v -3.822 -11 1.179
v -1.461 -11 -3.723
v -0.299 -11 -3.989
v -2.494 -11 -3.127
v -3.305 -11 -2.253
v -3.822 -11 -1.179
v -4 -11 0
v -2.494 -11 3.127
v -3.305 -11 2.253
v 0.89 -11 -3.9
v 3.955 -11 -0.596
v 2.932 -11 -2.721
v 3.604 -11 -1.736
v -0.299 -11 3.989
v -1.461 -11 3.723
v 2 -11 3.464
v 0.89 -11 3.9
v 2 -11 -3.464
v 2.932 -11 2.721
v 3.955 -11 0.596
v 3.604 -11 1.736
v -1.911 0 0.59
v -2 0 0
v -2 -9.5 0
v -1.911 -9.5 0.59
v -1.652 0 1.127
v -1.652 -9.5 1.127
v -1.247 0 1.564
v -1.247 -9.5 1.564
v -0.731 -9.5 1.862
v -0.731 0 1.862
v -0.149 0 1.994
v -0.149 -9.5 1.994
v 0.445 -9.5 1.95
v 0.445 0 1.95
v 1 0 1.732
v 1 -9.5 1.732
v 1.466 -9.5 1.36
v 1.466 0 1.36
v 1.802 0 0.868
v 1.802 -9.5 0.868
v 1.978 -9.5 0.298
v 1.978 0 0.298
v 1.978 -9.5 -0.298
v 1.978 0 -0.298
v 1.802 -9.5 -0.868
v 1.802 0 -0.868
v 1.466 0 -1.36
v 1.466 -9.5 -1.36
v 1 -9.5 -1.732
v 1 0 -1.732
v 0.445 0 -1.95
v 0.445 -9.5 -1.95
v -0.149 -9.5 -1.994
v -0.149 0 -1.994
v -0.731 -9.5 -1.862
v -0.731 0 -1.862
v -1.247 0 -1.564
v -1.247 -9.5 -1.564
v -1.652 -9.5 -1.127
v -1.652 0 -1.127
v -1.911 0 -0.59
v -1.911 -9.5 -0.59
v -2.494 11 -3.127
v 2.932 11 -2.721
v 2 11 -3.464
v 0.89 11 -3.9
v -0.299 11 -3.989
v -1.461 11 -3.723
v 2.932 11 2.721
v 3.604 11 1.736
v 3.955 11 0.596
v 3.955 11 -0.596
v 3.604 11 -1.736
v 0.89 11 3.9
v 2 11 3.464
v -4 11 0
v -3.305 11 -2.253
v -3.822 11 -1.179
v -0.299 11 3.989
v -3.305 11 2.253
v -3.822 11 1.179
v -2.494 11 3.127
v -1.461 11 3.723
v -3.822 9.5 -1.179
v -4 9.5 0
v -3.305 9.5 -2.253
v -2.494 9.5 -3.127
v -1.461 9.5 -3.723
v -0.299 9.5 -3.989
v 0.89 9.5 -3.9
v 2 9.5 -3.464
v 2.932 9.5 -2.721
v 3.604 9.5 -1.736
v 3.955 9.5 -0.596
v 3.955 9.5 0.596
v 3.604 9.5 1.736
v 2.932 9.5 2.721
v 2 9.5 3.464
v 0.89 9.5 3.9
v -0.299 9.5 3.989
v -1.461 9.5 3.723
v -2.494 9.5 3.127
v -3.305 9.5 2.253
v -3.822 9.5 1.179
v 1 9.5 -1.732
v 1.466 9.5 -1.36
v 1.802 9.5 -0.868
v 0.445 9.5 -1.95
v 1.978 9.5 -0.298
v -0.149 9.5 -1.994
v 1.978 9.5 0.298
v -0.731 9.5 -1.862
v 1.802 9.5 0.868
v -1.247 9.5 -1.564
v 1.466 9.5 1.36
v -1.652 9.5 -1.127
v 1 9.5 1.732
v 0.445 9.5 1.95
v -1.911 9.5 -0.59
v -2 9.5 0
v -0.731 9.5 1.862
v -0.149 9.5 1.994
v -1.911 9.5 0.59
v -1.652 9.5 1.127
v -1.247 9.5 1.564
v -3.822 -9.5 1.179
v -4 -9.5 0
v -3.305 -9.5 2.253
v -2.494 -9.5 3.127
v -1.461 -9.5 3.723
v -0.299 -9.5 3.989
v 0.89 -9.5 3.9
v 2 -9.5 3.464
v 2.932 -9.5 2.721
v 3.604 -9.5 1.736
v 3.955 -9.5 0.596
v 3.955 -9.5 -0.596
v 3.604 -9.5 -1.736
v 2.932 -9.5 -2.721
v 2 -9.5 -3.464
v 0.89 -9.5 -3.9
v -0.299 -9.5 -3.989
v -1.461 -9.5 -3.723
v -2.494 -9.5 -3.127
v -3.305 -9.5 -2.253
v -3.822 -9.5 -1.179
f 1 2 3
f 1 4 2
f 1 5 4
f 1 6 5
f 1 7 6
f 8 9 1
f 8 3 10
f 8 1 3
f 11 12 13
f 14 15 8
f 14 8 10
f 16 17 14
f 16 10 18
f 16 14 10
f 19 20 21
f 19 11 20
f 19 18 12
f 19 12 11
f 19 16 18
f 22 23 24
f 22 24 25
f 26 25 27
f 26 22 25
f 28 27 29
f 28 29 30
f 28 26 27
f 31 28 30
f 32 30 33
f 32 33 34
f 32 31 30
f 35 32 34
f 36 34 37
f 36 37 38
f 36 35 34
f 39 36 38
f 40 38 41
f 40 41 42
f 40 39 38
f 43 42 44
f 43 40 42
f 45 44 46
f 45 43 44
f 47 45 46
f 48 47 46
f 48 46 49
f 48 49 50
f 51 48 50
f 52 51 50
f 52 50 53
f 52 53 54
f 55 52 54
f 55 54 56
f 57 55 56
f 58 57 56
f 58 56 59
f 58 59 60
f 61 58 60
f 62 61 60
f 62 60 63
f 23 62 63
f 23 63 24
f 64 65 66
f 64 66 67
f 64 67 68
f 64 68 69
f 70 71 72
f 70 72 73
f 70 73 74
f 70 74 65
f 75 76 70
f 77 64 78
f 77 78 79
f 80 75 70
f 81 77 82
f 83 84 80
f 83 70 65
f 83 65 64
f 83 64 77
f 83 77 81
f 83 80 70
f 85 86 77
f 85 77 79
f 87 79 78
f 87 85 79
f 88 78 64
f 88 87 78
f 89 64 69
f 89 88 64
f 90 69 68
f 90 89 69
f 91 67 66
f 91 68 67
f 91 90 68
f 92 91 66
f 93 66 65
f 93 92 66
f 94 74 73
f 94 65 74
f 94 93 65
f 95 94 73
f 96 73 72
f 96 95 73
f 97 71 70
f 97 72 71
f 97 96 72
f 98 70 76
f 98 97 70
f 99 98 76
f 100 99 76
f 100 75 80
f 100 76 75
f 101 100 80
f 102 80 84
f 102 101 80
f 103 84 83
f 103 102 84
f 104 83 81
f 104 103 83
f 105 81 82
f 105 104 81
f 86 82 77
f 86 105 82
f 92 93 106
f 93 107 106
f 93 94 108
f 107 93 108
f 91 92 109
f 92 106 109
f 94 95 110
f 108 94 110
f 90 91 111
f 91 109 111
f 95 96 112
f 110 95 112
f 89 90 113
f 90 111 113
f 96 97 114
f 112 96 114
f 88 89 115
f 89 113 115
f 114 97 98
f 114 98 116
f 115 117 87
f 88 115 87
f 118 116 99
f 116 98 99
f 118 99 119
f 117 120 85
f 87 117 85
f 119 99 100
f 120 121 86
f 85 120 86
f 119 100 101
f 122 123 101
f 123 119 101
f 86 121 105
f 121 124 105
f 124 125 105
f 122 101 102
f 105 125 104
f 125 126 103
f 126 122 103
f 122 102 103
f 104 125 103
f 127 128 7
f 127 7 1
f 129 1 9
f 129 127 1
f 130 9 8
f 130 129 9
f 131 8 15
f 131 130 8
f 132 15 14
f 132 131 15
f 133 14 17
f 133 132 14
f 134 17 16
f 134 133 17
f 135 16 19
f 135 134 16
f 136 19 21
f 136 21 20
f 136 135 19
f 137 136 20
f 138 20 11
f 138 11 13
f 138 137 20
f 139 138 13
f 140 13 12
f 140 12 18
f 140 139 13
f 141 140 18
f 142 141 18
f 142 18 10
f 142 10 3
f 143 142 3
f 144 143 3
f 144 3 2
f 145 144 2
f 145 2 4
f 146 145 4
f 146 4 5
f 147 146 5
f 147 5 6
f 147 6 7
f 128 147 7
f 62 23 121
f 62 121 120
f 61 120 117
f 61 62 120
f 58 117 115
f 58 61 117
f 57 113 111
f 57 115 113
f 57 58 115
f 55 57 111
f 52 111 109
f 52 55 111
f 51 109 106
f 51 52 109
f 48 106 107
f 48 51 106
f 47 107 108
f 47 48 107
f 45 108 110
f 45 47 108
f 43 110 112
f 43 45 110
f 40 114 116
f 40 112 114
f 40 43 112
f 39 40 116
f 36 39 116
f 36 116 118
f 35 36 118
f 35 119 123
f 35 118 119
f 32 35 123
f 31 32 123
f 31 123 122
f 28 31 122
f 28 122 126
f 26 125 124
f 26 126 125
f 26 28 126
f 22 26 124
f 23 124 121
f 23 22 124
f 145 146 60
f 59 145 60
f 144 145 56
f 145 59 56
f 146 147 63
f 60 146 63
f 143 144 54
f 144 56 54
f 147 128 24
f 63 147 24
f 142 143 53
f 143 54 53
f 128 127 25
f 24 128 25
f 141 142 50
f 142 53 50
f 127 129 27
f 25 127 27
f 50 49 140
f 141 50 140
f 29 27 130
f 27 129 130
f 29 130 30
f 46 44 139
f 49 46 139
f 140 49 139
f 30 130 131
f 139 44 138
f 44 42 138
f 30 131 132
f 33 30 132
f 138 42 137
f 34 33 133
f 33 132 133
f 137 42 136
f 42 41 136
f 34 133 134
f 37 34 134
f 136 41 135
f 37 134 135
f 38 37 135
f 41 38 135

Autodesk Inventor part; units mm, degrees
ref_plane "YZ Plane" through (0, 0, 0) normal (1, 0, 0) x (0, 1, 0)
ref_plane "XZ Plane" through (0, 0, 0) normal (0, 1, 0) x (-1, 0, 0)
ref_plane "XY Plane" through (0, 0, 0) normal (0, 0, 1) x (1, 0, 0)
sketch "スケッチ1" plane through (0, 0, 0) normal (0, 0, 1) x (1, 0, 0)
  line L0 (0, 11) -> (-4, 11)
  line L1 (-4, 11) -> (-4, 9.5)
  line L2 (-4, 9.5) -> (-2, 9.5)
  line L3 (-2, 9.5) -> (-2, 0)
  line L4 (-2, 0) -> (0, 0)
  line L5 (0, 0) -> (0, 11)
  line L6 (0, -2.2) -> (0, 13.2) projected
  dimension "d0" = 4
  dimension "d1" = 1.5
  dimension "d2" = 2
  dimension "d3" = 11
revolve "回転1" add sketch "スケッチ1" angle 360 about axis through (0, -10, 0) along (0, 1, 0)
mirror "ミラー1" about plane through (-2, 0, 0) normal (0, -1, 0) of "回転1"
ref_plane "作業平面1" through (0, 0, 0) normal (0, -1, 0) x (1, 0, 0)
properties part number "castshaft" material "アルミニウム 6061"
